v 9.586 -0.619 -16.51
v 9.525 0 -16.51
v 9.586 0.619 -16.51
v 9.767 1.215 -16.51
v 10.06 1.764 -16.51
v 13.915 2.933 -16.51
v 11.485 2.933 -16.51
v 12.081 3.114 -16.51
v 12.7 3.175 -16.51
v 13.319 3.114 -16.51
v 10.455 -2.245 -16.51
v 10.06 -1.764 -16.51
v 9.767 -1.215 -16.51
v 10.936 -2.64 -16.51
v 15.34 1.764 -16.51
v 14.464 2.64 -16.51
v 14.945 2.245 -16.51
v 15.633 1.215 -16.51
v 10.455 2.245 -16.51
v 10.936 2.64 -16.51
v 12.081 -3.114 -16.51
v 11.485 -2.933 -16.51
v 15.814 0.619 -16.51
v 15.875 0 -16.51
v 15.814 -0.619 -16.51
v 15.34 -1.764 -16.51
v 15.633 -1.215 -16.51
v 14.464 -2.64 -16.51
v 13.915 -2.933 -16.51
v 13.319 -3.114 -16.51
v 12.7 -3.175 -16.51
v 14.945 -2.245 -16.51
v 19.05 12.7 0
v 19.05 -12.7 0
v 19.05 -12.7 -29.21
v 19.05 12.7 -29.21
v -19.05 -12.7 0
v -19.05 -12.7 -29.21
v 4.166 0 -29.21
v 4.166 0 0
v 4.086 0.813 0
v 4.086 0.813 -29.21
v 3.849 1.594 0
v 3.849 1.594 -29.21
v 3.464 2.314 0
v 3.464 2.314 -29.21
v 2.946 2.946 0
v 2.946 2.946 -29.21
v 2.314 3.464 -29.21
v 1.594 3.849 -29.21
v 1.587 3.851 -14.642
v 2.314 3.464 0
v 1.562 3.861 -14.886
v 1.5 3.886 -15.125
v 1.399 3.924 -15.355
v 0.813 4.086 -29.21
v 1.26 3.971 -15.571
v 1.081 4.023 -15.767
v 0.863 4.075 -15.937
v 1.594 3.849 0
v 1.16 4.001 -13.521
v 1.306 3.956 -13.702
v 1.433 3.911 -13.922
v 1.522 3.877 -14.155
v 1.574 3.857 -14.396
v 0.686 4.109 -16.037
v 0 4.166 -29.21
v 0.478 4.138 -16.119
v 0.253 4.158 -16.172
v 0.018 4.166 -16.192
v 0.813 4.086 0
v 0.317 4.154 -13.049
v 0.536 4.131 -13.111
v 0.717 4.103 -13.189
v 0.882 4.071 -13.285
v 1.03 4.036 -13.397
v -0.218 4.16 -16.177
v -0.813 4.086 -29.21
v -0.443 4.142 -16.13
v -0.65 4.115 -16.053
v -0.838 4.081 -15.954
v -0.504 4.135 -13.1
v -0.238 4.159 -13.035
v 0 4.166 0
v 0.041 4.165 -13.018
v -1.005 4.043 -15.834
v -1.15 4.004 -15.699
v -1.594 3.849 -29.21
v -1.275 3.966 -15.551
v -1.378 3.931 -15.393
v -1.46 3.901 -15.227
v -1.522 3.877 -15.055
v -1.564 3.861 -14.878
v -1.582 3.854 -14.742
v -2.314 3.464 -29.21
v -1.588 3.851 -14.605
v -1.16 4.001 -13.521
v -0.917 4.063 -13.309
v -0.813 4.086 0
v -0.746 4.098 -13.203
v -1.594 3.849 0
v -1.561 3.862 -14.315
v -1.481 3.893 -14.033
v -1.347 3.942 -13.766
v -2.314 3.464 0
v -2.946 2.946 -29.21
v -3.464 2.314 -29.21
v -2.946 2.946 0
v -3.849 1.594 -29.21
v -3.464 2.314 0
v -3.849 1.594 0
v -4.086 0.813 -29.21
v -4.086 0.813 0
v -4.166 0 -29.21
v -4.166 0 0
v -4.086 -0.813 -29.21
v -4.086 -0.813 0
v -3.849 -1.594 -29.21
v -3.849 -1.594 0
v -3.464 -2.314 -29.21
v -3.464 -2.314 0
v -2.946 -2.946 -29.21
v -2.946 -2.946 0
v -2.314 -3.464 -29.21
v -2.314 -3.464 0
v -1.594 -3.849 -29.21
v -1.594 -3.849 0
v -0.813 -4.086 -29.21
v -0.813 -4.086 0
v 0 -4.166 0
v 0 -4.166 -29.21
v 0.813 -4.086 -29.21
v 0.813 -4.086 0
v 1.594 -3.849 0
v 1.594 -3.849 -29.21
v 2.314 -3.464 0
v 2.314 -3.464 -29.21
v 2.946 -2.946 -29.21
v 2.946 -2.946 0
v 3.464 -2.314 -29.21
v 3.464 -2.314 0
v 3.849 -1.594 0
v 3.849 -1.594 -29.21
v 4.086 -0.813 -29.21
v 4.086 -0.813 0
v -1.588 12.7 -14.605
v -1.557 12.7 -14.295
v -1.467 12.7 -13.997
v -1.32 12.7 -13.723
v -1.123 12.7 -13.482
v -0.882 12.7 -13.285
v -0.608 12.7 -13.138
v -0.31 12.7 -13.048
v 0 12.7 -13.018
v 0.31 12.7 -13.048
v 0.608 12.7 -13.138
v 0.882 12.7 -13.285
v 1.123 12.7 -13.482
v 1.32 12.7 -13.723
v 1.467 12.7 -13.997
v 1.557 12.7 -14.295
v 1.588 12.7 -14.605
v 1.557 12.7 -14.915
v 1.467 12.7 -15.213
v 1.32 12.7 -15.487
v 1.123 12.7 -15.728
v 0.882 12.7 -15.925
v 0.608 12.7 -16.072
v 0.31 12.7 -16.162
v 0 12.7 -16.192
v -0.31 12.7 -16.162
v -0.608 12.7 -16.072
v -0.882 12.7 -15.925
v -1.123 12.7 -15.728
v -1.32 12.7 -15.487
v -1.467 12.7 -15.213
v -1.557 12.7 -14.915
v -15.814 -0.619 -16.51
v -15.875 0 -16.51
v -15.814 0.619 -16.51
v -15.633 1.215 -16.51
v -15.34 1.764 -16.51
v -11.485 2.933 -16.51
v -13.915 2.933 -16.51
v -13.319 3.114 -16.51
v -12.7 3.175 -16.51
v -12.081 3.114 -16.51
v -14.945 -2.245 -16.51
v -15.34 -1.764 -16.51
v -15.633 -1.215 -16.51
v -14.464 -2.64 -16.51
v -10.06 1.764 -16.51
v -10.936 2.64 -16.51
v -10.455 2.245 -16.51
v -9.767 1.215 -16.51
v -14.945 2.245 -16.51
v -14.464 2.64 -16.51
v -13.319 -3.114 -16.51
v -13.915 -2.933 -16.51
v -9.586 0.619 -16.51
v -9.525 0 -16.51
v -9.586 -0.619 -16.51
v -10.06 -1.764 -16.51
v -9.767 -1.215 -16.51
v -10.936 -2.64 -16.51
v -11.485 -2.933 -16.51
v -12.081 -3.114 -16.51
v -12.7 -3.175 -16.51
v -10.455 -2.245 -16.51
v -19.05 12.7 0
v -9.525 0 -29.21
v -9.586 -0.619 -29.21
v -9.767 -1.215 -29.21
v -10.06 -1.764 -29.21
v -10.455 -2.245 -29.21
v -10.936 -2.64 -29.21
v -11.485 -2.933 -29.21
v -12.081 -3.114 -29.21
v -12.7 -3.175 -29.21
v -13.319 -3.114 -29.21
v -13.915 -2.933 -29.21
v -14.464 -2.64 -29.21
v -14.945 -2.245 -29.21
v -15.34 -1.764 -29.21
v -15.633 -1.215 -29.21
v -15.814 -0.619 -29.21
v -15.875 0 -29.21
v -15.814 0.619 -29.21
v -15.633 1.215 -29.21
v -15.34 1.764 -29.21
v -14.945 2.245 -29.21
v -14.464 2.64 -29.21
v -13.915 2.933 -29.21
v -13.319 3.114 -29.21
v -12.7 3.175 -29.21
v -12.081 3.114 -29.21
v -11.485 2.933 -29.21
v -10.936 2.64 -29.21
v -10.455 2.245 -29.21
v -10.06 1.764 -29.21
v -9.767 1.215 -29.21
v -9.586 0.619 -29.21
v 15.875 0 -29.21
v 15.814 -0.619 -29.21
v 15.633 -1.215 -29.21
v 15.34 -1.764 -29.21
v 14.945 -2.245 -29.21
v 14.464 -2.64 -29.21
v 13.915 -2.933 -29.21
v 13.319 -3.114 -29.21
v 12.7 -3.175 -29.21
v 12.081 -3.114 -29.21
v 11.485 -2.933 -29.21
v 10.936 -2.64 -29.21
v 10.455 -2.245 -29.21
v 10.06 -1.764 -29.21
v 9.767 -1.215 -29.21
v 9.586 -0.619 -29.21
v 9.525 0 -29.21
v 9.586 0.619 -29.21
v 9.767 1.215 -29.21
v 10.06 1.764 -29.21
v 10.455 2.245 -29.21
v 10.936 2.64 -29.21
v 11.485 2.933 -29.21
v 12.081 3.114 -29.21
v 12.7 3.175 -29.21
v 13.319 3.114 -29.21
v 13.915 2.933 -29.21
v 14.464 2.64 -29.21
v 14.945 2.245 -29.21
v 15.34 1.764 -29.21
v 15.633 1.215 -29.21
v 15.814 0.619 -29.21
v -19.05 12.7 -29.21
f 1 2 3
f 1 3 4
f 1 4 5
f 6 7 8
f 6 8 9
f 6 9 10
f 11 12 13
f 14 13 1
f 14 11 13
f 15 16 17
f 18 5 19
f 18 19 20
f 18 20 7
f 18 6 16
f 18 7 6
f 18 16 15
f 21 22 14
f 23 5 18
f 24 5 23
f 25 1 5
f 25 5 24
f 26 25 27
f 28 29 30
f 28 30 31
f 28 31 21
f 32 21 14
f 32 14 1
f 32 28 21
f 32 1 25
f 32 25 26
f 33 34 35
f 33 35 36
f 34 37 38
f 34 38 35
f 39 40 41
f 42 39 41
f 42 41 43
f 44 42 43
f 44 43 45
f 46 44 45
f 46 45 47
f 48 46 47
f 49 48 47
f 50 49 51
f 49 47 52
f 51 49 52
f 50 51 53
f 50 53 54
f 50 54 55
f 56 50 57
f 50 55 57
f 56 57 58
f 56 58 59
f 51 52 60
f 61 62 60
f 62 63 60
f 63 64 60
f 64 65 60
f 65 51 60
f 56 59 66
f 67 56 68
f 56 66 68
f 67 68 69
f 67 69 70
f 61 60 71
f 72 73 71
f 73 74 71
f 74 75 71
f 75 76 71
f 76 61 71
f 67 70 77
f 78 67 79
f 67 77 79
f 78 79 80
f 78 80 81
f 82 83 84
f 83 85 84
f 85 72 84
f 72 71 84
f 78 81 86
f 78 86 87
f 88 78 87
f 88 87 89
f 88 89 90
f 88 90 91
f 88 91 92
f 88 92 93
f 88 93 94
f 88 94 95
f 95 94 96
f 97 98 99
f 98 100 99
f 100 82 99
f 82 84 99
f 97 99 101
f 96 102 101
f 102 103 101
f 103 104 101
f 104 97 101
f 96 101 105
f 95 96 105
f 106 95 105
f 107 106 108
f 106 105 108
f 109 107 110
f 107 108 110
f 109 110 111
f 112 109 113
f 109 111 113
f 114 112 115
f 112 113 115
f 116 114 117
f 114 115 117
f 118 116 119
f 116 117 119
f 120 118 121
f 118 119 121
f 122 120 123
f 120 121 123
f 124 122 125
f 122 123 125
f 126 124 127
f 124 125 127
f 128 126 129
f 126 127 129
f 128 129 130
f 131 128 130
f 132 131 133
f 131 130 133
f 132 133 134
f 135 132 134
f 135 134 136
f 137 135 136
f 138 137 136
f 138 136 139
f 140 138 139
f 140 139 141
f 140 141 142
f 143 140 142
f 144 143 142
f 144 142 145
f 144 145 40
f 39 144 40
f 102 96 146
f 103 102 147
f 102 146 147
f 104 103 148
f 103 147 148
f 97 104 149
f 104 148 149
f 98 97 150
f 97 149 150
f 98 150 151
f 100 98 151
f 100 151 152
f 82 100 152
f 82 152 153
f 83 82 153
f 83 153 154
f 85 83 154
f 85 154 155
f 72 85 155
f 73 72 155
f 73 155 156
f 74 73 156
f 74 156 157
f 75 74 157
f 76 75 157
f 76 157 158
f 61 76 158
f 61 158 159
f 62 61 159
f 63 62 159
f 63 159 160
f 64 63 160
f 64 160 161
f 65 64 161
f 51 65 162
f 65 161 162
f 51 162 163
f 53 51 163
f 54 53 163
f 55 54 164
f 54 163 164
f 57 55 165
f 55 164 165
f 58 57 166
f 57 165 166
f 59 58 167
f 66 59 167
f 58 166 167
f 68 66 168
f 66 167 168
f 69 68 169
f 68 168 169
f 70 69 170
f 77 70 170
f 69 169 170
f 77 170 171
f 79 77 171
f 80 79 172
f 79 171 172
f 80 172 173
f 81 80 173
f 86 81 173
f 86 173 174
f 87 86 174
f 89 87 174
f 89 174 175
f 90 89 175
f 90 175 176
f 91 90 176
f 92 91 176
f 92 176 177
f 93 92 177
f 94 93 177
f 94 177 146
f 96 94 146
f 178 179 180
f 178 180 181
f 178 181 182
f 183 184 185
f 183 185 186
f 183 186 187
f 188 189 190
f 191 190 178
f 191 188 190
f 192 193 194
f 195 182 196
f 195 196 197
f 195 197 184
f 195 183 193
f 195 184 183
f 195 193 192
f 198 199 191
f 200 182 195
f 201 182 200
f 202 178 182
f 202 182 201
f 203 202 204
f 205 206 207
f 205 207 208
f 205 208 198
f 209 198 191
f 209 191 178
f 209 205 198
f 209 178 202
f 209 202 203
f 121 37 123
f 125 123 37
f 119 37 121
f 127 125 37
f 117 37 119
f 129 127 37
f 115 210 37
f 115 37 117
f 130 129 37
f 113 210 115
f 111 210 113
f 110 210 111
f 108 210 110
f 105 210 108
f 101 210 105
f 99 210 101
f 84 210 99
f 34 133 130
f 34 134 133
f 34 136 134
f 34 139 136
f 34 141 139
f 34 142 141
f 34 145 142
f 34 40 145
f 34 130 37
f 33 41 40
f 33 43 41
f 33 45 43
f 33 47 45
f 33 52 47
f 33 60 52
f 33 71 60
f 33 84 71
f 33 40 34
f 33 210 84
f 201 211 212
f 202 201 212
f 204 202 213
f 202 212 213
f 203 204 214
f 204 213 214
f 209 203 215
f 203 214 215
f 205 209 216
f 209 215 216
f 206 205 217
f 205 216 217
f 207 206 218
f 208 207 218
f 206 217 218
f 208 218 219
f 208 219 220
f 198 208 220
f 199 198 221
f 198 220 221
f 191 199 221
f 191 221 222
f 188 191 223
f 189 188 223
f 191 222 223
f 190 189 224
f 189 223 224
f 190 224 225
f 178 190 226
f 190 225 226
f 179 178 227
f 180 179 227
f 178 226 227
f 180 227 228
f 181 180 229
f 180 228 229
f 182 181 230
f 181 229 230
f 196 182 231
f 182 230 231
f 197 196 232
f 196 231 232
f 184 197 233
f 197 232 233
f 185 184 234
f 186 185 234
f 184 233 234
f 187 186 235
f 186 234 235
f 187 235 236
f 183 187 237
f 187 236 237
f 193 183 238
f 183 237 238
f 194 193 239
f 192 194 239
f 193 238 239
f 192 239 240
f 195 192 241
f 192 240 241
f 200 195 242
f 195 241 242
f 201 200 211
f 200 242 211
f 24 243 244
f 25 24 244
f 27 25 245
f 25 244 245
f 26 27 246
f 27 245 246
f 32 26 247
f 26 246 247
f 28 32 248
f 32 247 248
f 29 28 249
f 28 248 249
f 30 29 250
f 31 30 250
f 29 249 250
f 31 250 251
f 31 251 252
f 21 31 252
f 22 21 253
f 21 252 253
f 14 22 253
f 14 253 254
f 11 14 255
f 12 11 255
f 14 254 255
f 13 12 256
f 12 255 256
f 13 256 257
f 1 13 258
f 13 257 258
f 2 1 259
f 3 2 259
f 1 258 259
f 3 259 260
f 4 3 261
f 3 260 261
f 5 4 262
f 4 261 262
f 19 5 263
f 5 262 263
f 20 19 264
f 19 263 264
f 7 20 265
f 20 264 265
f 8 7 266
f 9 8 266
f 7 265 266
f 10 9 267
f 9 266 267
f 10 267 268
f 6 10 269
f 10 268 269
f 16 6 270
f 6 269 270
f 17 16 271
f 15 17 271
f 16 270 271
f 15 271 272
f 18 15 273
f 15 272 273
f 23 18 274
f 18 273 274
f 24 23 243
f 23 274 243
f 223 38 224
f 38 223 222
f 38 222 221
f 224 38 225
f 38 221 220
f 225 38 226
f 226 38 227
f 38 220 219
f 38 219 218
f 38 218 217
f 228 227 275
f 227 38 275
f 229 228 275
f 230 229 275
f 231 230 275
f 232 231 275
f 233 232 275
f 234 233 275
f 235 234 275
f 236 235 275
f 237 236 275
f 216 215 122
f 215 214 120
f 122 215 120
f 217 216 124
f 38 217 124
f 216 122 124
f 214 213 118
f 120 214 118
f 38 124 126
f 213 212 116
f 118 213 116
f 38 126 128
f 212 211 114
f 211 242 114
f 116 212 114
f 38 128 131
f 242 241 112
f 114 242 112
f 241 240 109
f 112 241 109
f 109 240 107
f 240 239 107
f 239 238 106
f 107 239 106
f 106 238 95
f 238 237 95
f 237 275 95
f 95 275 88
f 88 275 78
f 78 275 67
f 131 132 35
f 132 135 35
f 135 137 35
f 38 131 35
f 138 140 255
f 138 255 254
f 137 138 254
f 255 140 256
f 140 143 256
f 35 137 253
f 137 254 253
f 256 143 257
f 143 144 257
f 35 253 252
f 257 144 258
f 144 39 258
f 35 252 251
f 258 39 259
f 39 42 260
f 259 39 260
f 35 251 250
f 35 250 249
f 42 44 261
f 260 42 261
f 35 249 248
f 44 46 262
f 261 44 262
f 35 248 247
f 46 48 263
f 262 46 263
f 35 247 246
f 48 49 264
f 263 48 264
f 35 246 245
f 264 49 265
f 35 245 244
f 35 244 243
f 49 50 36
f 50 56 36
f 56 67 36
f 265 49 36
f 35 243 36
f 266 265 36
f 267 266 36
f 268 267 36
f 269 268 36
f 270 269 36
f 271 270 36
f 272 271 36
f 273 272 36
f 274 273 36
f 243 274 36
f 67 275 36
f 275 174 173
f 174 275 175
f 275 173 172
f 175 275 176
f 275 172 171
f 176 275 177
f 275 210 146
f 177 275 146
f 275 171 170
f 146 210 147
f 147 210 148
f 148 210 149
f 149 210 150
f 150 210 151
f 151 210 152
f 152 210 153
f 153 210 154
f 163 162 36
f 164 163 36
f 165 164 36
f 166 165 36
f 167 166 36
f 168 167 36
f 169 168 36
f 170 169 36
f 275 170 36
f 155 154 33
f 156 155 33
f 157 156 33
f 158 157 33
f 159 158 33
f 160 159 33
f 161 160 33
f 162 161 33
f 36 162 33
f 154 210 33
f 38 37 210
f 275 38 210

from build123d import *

# Parameters (mm, degrees)
F0_W     = 38.1
F0_H     = 25.4
F0_R     = 4.1656
F1_DEPTH = 29.21
F2_R     = 3.175
F3_DEPTH = 12.7
F4_R     = 1.5875
F5_DEPTH = 12.7


with BuildPart() as f1:
    # F0 (on Top) → F1 (new body)
    with BuildSketch(Plane.XY):
        Rectangle(F0_W, F0_H)
        Circle(F0_R, mode=Mode.SUBTRACT)
    extrude(amount=-F1_DEPTH)

    # F2 (on face) → F3 (cut)
    with BuildSketch(Plane(origin=(0, 0, -29.21), x_dir=(1, 0, 0), z_dir=(0, 0, -1))):
        with Locations((-12.7, 0)):
            Circle(F2_R)
        with Locations((12.7, 0)):
            Circle(F2_R)
    extrude(amount=-F3_DEPTH, mode=Mode.SUBTRACT)

    # F4 (on face) → F5 (cut)
    with BuildSketch(Plane(origin=(0, 12.7, 0), x_dir=(-1, 0, 0), z_dir=(0, 1, 0))):
        with Locations((0, -14.605)):
            Circle(F4_R)
    extrude(amount=-F5_DEPTH, mode=Mode.SUBTRACT)


solid = f1.part
